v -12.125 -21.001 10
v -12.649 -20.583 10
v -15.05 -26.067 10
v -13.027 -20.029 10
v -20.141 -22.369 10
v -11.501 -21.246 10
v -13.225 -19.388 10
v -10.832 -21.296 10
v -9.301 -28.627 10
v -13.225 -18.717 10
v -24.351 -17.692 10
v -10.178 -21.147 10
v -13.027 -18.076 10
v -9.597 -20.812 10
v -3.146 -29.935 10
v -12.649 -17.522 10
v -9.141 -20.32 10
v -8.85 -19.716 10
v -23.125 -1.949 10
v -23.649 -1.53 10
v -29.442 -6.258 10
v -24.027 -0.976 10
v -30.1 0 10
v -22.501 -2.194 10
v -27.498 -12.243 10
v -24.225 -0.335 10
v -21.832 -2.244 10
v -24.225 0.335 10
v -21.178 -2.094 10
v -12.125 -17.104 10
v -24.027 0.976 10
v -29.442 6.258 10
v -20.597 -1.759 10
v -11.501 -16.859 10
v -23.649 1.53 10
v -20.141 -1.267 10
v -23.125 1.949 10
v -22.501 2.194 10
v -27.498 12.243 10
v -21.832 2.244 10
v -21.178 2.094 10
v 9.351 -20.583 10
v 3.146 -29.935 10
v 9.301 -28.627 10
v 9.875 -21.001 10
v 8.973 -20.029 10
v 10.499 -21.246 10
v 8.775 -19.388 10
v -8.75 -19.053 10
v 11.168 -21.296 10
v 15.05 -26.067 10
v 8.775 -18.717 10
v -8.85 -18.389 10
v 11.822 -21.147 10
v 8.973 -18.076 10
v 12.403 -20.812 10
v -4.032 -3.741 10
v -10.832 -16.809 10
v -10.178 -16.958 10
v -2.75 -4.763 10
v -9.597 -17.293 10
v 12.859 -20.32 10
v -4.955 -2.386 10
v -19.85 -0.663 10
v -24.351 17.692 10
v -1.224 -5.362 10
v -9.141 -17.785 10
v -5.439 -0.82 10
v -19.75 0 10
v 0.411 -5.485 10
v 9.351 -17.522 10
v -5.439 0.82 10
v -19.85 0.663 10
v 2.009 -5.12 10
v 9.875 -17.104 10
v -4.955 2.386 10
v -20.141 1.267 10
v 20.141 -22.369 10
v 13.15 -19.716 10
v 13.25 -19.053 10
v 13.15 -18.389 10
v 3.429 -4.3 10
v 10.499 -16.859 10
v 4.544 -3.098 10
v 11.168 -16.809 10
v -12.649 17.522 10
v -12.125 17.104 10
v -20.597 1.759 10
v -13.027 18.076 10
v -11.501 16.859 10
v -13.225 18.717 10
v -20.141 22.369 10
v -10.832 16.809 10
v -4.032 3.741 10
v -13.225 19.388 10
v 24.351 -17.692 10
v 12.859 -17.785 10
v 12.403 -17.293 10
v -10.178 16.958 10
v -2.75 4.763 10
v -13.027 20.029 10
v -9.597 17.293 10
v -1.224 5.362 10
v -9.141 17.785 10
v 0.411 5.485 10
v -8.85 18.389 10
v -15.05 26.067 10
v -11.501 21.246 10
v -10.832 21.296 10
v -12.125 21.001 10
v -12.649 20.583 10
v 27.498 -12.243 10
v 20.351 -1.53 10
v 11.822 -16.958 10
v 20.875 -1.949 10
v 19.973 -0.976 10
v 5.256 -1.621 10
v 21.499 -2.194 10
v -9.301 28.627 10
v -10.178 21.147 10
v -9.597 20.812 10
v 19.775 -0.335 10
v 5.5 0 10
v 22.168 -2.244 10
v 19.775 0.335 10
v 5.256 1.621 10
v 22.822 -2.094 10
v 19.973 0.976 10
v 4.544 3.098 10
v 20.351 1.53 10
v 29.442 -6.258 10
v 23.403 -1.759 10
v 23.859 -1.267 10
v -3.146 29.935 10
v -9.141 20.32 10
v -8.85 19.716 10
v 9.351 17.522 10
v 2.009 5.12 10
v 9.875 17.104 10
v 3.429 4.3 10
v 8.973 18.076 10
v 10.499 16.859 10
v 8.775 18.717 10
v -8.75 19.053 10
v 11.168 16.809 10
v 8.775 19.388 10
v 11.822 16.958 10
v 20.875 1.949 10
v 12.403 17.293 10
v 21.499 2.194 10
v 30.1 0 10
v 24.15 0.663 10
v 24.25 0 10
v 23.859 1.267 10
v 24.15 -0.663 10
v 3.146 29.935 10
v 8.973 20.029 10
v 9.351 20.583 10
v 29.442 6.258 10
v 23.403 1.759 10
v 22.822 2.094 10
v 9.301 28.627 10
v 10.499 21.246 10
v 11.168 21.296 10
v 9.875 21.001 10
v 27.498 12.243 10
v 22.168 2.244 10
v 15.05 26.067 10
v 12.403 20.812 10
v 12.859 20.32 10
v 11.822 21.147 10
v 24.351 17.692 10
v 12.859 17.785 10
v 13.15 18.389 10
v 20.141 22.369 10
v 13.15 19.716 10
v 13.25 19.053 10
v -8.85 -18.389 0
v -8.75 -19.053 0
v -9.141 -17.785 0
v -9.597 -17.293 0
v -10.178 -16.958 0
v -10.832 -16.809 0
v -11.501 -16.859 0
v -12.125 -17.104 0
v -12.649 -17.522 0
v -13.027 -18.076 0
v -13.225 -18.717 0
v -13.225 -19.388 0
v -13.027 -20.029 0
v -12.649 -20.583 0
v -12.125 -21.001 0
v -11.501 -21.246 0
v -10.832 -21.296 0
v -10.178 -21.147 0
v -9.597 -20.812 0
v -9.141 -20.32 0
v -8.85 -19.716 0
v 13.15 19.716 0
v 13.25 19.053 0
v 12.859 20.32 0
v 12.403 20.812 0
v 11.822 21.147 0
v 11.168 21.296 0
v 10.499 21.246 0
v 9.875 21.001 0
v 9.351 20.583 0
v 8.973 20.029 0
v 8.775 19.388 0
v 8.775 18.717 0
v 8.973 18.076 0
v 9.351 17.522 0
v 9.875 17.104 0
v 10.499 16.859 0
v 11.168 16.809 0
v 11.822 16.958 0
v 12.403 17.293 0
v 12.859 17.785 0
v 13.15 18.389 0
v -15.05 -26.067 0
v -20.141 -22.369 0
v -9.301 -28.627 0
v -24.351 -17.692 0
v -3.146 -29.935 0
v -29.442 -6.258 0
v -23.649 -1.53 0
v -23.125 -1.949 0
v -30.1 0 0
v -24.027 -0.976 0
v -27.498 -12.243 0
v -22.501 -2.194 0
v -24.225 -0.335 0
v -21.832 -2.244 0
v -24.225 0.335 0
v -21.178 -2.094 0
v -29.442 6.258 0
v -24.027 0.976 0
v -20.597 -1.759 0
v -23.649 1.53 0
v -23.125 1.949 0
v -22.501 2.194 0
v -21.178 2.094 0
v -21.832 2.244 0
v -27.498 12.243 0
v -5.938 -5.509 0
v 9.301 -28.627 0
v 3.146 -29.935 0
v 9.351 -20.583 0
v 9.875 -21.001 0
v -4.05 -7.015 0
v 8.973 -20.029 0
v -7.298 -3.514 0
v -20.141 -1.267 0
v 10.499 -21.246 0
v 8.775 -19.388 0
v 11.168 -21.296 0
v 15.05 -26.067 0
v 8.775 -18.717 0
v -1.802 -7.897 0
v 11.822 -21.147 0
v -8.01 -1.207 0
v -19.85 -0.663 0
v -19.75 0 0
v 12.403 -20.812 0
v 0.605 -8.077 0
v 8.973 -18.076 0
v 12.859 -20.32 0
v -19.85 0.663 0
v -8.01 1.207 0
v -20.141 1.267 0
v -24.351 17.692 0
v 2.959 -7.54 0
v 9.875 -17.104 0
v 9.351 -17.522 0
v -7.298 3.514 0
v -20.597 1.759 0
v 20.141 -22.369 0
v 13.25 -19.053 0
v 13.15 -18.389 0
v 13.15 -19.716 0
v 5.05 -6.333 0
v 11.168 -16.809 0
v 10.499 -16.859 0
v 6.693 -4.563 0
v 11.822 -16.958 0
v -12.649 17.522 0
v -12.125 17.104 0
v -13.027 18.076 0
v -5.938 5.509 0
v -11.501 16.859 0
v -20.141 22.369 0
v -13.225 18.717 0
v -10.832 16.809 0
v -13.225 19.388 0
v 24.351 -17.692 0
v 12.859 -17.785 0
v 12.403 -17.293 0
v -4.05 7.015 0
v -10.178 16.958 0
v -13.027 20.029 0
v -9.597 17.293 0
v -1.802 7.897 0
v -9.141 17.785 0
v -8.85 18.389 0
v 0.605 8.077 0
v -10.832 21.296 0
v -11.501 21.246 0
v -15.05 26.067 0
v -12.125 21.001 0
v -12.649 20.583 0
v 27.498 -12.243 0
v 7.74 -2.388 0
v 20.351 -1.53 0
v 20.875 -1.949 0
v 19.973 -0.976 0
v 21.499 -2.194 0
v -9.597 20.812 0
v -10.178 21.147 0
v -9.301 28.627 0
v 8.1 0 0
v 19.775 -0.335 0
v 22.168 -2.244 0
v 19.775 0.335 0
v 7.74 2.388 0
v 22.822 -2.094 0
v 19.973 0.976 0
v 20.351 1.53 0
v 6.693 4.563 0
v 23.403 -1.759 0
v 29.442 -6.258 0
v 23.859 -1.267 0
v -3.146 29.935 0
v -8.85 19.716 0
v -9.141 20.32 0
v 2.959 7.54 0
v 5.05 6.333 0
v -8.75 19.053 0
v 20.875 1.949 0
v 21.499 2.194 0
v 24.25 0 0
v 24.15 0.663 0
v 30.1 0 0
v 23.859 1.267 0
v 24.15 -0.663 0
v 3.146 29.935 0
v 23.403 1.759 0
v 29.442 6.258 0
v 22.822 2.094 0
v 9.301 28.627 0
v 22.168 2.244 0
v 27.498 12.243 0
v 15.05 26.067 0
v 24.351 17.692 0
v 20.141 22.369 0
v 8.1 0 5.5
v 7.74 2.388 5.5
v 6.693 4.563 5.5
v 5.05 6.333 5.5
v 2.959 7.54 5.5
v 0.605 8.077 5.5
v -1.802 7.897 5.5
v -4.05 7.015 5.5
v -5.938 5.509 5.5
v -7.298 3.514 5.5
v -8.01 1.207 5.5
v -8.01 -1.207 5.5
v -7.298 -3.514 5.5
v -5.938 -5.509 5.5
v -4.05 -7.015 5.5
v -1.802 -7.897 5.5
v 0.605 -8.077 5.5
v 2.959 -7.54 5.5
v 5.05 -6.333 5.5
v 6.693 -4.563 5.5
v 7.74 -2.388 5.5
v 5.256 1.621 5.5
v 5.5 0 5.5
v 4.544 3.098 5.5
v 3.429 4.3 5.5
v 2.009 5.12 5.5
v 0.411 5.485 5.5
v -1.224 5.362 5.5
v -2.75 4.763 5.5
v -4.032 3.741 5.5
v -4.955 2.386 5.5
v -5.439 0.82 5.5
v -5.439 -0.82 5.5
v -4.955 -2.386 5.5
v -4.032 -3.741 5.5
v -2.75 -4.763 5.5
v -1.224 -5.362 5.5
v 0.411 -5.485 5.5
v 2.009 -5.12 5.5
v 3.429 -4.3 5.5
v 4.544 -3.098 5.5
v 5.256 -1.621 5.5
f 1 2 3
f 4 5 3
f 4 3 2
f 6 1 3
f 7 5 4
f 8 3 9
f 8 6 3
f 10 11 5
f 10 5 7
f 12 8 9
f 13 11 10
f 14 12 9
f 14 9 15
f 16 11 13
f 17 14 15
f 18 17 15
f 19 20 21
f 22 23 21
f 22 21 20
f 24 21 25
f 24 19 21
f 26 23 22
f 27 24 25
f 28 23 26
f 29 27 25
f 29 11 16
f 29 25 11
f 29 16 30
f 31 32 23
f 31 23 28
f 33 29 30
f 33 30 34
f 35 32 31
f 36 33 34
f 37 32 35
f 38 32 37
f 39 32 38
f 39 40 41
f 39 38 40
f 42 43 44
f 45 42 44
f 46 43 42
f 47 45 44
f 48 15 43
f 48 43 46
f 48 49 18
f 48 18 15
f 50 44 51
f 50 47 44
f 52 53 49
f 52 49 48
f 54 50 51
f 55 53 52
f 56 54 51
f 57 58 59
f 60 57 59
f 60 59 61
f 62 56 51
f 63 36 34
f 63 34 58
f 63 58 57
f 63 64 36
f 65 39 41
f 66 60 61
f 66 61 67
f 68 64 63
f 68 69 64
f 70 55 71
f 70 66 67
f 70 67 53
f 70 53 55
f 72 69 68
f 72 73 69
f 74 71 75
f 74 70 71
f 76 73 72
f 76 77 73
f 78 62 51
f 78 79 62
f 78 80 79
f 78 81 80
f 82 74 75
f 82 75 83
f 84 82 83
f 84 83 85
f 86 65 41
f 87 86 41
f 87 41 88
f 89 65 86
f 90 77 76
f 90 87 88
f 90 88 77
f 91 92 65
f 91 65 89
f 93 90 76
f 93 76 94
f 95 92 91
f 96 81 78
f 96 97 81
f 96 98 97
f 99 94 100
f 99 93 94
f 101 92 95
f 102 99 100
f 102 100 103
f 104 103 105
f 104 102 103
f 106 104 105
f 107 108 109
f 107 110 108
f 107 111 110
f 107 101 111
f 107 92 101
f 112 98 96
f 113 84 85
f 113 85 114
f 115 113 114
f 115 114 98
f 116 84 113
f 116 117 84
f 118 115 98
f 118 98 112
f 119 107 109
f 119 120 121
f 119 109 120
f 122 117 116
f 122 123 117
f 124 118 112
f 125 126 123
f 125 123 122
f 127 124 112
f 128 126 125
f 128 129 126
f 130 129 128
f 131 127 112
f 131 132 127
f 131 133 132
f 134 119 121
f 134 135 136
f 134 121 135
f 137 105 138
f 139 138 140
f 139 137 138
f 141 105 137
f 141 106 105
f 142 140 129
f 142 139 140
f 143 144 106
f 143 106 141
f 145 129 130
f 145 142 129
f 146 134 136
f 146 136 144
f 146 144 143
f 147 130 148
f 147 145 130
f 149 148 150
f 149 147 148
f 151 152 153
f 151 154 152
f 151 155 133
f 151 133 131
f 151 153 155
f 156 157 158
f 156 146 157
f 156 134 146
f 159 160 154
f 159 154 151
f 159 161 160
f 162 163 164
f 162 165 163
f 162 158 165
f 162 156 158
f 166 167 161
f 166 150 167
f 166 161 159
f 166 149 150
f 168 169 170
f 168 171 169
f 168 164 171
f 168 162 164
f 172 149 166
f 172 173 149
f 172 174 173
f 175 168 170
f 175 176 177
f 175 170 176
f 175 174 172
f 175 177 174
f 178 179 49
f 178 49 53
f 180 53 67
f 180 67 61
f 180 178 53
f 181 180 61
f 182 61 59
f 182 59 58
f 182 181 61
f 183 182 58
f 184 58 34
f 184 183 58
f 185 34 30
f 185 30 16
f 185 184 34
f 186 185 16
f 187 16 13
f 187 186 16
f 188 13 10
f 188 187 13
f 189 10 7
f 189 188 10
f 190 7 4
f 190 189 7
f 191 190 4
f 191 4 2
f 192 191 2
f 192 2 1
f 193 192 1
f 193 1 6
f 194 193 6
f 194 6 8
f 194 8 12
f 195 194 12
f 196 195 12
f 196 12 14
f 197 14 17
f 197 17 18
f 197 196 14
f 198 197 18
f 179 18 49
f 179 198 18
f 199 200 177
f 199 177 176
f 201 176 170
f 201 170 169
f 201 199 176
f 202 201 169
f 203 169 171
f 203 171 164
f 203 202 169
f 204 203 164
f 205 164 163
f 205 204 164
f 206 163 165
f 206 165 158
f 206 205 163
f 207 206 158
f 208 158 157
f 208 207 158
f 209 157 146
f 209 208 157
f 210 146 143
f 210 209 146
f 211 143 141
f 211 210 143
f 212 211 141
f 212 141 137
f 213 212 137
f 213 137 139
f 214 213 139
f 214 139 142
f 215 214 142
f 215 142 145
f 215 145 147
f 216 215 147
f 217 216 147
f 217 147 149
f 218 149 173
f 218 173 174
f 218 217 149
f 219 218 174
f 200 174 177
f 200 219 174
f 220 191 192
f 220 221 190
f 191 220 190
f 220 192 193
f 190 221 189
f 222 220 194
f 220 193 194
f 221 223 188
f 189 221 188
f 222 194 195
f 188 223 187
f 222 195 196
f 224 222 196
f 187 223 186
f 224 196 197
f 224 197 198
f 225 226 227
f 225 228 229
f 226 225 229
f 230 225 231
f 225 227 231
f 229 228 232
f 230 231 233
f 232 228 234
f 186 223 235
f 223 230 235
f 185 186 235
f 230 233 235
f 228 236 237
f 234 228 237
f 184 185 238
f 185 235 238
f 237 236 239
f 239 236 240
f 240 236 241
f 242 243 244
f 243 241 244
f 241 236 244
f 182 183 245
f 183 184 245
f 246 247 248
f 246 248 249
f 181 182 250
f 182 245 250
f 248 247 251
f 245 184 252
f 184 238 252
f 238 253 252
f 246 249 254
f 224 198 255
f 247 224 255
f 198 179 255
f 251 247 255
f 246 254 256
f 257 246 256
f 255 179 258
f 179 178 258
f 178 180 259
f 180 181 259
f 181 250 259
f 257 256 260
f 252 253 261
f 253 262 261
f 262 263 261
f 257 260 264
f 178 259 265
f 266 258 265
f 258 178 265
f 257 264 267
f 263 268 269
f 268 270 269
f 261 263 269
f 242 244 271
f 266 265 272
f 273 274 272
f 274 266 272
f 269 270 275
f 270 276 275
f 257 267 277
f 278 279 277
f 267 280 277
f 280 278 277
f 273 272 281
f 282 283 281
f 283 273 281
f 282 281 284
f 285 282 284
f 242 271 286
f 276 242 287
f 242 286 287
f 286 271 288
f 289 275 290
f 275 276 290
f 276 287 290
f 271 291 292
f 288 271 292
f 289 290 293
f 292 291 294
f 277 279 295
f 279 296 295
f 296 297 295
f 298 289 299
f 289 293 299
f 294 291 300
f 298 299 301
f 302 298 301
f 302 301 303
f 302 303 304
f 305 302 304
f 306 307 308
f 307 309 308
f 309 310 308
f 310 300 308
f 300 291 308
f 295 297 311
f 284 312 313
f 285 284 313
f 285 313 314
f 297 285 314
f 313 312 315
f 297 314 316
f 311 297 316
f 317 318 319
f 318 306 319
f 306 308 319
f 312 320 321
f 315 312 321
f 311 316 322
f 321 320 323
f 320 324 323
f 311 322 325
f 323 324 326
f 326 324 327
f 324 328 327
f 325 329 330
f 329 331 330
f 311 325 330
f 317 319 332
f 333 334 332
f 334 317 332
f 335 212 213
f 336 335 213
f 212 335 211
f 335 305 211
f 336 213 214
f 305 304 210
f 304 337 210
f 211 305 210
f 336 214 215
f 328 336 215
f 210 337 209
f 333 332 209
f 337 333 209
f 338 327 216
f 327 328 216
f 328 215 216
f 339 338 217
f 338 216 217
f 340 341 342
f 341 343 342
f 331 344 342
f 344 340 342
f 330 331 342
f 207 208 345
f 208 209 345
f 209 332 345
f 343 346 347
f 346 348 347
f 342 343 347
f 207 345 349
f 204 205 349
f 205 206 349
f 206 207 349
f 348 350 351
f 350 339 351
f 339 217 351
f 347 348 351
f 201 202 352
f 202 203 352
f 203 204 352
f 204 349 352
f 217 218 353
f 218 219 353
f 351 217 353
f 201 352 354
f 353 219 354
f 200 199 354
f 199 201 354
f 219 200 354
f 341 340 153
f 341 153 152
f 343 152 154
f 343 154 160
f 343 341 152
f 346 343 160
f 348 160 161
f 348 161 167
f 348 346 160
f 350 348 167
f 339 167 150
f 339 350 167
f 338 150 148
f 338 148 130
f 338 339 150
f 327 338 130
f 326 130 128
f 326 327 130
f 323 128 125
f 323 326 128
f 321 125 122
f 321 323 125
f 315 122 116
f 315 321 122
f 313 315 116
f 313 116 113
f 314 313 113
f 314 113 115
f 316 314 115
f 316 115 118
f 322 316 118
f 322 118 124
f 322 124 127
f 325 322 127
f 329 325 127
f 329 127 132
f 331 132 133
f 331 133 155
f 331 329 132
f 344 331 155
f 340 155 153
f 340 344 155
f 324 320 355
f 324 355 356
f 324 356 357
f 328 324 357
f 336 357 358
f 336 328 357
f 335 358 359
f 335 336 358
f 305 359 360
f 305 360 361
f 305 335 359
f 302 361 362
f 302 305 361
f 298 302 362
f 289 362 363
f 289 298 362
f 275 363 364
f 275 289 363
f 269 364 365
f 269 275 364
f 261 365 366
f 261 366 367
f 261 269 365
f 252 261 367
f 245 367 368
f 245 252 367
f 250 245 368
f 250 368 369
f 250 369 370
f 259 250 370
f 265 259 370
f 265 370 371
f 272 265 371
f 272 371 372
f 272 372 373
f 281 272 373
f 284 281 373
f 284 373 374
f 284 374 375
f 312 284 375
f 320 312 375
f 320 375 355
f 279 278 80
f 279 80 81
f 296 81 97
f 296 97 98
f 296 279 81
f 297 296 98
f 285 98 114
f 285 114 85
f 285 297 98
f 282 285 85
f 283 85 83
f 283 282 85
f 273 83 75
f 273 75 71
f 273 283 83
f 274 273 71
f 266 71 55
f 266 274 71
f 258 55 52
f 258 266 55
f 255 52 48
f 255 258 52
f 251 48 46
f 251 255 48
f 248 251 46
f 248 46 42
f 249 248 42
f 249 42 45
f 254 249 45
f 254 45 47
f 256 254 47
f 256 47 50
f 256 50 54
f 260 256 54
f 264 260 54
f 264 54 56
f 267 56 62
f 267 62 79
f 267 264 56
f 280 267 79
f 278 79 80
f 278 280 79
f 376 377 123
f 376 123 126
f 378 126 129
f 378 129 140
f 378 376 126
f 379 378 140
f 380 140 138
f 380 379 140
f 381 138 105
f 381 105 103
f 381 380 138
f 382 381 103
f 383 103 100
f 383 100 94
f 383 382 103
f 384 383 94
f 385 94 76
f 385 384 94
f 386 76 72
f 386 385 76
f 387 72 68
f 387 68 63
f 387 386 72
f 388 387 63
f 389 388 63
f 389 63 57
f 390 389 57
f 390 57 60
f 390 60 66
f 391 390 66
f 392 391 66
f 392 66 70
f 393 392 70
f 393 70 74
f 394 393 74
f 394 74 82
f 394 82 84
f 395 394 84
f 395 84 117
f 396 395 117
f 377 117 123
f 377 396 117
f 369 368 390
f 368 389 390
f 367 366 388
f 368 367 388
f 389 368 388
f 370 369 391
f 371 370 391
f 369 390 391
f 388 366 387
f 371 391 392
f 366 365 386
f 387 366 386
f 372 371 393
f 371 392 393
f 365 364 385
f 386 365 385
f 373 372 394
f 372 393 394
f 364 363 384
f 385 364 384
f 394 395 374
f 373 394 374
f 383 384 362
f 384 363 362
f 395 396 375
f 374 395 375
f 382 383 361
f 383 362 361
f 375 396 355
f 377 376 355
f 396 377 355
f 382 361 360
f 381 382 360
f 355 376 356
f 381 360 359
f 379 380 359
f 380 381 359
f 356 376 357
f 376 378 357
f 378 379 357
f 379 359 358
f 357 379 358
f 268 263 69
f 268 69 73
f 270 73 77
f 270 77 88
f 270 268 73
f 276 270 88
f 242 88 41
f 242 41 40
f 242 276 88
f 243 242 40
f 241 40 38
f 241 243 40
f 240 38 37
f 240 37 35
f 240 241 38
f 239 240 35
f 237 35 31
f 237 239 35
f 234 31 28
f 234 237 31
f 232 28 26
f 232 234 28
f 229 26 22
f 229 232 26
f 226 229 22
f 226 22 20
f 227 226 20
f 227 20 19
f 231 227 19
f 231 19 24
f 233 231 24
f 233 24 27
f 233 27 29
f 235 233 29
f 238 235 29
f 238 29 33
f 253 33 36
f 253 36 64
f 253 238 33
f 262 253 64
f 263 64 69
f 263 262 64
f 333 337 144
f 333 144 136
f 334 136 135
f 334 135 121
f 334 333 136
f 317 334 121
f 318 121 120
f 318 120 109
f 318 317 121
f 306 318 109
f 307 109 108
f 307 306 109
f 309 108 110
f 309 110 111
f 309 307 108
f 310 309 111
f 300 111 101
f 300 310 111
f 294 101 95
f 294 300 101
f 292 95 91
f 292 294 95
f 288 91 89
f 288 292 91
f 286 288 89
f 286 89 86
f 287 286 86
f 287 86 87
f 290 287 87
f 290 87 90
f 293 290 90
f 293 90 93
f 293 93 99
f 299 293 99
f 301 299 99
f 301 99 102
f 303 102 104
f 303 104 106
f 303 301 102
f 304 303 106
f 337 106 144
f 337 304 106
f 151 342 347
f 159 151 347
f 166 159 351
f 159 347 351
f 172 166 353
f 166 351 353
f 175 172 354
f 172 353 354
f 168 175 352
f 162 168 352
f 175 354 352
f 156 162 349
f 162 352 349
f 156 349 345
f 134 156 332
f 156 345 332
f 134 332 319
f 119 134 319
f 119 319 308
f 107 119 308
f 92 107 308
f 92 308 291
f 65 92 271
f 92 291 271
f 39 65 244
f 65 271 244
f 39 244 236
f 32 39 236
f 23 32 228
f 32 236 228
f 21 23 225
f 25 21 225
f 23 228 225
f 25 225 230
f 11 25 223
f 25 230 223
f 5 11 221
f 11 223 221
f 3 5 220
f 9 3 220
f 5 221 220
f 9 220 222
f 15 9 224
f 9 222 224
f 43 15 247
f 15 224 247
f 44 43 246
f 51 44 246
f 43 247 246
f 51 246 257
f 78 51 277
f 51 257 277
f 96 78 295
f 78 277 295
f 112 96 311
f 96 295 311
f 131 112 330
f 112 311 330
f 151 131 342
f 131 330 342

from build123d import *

# Parameters (mm, degrees)
ESQUISSE1_R        = 30.1
ESQUISSE1_R_2      = 2.25
ESQUISSE1_R_3      = 8.1
BOSS_EXTRU_1_DEPTH = 10
BOSS_EXTRU_2_START = -4.5
ESQUISSE2_R        = 8.1
ESQUISSE2_R_2      = 5.5
BOSS_EXTRU_2_DEPTH = 4.5


with BuildPart() as part:
    # Esquisse1 → Boss.-Extru.1 (new body)
    with BuildSketch(Plane.XY):
        Circle(ESQUISSE1_R)
        with Locations((22, 0)):
            Circle(ESQUISSE1_R_2, mode=Mode.SUBTRACT)
        with Locations((11, -19.052558883)):
            Circle(ESQUISSE1_R_2, mode=Mode.SUBTRACT)
        with Locations((-11, -19.052558883)):
            Circle(ESQUISSE1_R_2, mode=Mode.SUBTRACT)
        with Locations((-22, 0)):
            Circle(ESQUISSE1_R_2, mode=Mode.SUBTRACT)
        with Locations((-11, 19.052558883)):
            Circle(ESQUISSE1_R_2, mode=Mode.SUBTRACT)
        with Locations((11, 19.052558883)):
            Circle(ESQUISSE1_R_2, mode=Mode.SUBTRACT)
        Circle(ESQUISSE1_R_3, mode=Mode.SUBTRACT)
    extrude(amount=BOSS_EXTRU_1_DEPTH)

    # Esquisse2 → Boss.-Extru.2 (add)
    with BuildSketch(Plane.XY.offset(10).offset(BOSS_EXTRU_2_START)):
        Circle(ESQUISSE2_R)
        Circle(ESQUISSE2_R_2, mode=Mode.SUBTRACT)
    extrude(amount=BOSS_EXTRU_2_DEPTH)


solid = part.part
